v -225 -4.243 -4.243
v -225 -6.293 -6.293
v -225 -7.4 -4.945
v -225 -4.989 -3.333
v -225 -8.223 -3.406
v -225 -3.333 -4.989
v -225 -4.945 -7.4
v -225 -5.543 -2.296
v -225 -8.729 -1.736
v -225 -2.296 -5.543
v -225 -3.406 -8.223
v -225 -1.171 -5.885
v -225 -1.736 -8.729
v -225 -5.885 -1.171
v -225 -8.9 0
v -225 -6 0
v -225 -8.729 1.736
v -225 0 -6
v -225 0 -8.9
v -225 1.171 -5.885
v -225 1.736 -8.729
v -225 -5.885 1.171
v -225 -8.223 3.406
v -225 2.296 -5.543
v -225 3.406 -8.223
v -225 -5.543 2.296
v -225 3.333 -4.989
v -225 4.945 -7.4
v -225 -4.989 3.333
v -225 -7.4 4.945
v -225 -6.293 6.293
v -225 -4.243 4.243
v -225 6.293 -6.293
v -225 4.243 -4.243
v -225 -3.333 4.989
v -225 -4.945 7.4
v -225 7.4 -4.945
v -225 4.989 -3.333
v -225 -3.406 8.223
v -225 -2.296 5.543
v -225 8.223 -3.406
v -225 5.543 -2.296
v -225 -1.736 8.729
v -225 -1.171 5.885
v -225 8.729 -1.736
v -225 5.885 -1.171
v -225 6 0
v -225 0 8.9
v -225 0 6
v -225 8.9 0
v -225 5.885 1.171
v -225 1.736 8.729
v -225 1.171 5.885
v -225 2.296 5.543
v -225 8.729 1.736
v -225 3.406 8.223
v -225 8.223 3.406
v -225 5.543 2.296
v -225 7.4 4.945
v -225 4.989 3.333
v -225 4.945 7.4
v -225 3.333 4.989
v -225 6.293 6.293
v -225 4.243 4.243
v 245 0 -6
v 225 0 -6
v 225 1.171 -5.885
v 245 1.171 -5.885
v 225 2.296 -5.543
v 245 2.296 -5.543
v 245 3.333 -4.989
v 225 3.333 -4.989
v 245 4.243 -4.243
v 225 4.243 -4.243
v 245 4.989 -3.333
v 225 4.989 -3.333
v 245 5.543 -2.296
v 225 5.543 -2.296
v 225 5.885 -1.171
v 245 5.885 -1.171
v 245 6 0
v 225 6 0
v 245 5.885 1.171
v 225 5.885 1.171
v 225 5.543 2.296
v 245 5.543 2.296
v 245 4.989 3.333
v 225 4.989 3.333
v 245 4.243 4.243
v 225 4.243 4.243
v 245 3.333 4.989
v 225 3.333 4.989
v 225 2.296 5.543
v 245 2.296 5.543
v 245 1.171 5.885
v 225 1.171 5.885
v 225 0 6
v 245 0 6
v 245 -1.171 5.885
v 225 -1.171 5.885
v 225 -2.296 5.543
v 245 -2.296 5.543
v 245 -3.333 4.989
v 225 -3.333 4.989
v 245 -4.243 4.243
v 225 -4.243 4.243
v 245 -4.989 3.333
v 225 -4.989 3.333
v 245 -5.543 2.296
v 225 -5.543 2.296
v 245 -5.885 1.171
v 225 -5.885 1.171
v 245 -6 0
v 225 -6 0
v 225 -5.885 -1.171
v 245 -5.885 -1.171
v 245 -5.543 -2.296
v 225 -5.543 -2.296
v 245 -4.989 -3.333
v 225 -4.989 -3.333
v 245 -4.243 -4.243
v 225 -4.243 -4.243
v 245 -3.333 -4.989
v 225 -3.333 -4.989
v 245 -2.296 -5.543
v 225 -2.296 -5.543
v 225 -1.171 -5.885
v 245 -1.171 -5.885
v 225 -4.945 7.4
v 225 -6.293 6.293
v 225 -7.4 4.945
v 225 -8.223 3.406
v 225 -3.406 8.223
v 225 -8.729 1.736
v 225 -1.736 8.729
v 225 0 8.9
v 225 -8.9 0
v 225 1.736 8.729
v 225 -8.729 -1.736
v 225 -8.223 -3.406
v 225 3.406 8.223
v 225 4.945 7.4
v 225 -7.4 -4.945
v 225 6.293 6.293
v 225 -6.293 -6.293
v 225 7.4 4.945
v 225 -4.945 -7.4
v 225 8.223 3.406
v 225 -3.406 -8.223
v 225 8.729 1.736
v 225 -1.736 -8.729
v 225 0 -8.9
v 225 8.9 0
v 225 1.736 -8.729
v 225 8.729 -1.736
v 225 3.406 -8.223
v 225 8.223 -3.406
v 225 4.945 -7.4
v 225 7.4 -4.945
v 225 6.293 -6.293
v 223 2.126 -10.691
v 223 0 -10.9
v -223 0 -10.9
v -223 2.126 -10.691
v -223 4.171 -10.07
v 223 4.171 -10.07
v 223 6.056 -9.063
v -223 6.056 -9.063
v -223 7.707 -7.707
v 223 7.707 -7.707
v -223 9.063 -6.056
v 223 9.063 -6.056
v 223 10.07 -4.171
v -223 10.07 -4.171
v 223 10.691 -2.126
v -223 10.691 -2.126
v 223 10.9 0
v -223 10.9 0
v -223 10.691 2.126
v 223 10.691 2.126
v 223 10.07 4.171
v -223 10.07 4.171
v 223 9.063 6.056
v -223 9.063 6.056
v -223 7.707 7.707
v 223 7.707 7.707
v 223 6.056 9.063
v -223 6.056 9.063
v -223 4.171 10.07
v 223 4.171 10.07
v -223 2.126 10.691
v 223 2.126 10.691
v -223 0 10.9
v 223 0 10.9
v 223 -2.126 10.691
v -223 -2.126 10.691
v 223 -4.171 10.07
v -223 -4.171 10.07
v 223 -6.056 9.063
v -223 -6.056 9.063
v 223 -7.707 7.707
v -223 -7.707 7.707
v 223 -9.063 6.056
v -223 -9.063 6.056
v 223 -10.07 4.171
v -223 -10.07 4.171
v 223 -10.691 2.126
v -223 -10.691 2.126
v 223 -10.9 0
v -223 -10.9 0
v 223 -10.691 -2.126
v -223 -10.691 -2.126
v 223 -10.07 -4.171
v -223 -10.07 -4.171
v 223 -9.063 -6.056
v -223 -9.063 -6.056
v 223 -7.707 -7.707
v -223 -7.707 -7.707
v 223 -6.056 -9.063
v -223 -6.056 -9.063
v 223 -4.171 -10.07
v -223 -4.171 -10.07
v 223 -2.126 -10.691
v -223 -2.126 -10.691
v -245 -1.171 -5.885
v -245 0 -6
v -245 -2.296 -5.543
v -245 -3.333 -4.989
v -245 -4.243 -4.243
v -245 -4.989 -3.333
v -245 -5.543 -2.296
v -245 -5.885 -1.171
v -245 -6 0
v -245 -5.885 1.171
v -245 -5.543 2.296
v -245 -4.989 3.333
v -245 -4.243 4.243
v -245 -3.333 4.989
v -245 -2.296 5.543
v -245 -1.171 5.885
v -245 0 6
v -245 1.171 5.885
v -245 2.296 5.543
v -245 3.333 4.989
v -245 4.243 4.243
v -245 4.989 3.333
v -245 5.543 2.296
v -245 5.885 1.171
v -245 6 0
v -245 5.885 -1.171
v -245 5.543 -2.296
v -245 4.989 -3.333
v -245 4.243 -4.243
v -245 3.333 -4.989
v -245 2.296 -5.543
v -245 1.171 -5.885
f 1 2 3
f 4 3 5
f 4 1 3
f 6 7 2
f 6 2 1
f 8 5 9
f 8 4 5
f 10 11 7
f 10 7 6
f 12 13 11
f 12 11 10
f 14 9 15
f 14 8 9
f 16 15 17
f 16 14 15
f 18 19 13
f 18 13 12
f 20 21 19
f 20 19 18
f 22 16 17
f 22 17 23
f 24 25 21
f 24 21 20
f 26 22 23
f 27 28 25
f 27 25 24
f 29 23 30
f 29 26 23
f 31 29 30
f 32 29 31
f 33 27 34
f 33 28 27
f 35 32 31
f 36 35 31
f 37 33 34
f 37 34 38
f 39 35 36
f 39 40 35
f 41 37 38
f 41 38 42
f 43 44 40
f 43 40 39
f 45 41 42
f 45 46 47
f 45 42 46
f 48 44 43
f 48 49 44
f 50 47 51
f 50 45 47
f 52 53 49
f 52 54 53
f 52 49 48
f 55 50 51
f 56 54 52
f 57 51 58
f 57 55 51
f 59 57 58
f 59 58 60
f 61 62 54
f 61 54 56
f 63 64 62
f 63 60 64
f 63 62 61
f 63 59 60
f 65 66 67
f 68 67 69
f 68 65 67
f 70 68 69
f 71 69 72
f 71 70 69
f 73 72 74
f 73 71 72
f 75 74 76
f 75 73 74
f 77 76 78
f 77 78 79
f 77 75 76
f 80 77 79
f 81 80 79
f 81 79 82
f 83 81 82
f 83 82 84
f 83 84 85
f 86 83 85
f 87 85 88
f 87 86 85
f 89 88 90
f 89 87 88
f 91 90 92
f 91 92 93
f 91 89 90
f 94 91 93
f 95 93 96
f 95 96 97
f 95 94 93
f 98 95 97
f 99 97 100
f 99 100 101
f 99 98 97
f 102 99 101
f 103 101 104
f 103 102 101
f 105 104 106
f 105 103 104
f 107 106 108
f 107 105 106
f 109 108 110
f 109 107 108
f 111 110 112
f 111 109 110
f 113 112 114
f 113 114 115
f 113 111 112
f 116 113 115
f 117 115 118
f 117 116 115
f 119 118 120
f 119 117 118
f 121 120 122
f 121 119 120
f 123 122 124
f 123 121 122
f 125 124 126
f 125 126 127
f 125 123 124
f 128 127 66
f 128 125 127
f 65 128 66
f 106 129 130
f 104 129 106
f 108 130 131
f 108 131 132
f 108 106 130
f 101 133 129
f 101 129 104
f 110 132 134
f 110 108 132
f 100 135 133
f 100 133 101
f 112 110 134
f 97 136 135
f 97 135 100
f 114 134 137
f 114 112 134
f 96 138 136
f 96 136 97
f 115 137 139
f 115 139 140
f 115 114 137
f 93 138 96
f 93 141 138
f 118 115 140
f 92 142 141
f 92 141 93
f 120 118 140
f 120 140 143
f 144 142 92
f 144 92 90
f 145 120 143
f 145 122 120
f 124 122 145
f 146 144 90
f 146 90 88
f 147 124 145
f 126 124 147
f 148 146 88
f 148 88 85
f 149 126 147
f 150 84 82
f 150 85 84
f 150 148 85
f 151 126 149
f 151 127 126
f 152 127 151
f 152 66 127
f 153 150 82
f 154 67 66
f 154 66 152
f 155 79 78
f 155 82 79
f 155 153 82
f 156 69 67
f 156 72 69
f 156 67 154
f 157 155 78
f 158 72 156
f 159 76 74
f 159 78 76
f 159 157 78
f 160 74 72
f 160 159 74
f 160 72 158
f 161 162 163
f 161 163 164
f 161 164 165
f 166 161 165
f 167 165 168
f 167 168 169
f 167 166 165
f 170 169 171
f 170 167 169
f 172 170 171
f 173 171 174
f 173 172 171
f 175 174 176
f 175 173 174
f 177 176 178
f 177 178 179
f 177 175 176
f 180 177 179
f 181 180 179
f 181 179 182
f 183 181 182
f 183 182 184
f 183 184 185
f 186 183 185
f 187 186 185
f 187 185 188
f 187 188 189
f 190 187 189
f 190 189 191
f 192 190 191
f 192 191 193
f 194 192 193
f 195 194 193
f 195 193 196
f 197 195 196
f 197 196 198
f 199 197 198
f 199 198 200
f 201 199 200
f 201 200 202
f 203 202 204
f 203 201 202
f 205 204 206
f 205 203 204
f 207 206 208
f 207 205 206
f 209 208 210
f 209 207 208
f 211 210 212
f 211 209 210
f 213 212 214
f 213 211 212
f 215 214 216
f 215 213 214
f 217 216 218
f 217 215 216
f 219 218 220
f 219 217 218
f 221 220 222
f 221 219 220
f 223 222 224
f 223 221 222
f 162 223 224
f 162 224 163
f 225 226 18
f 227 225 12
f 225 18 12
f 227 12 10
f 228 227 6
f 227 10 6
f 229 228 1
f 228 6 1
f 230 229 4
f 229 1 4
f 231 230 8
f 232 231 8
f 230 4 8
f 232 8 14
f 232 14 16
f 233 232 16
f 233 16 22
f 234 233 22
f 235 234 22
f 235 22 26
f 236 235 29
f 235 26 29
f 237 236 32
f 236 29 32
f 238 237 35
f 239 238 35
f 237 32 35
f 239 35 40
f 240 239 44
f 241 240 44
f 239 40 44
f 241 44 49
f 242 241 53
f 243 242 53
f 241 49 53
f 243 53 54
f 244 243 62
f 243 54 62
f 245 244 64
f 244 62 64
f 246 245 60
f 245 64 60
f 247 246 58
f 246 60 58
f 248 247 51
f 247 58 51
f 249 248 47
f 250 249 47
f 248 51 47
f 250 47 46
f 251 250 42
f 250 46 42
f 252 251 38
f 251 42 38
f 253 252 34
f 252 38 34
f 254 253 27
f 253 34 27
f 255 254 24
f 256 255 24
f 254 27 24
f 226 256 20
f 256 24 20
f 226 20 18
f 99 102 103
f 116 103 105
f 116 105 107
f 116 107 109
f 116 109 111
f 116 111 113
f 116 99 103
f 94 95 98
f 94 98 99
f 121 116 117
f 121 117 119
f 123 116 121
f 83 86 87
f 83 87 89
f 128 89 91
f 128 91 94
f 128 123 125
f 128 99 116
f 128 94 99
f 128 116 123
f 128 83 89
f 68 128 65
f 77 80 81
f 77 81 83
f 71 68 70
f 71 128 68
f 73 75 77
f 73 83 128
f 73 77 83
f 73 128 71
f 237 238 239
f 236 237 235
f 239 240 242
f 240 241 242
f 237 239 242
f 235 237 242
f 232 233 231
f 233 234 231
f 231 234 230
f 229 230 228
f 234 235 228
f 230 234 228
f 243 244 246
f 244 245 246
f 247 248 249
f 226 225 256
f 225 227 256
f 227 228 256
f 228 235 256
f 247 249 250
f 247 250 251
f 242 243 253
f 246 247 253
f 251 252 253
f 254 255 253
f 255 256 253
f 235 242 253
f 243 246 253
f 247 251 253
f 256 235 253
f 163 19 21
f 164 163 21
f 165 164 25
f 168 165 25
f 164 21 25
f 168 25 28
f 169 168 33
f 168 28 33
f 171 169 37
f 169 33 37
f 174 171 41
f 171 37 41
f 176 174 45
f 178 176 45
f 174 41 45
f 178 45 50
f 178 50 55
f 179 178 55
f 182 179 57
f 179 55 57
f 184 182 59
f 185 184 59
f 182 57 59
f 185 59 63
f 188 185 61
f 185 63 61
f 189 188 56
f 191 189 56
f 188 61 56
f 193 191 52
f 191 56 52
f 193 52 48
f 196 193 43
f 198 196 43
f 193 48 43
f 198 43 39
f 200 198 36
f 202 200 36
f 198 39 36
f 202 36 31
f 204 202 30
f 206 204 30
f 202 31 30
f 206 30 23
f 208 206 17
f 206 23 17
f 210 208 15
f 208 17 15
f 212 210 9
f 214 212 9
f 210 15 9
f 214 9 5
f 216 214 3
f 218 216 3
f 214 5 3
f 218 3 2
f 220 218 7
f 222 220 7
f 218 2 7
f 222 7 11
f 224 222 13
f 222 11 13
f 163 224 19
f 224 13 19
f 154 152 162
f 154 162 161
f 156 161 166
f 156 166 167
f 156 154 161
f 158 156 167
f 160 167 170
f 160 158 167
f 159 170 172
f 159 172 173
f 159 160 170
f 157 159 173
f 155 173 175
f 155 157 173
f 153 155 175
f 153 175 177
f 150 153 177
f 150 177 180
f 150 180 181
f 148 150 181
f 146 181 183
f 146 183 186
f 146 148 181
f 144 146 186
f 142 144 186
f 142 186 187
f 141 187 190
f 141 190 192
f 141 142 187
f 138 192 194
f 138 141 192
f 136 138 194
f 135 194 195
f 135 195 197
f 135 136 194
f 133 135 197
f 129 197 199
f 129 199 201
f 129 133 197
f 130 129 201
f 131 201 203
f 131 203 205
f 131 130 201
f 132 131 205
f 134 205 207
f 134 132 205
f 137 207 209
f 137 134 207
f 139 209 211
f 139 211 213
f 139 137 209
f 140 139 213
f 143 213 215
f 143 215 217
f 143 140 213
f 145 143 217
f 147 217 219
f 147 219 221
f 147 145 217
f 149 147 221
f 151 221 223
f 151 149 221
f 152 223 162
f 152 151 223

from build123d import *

# Parameters (mm, degrees)
SKETCH1_R           = 10.9
BOSS_EXTRUDE1_DEPTH = 245
SKETCH2_R           = 10.9
SKETCH2_R_2         = 6
CUT_EXTRUDE1_DEPTH  = 20
CUT_EXTRUDE2_START  = -20
SKETCH4_R           = 10.9
SKETCH4_R_2         = 6
CUT_EXTRUDE2_DEPTH  = 20
CHAMFER1_SIZE       = 2


with BuildPart() as part:
    # Sketch1 → Boss-Extrude1 (new, symmetric)
    with BuildSketch(Plane(origin=(0, 0, 0), x_dir=(0, 0, -1), z_dir=(1, 0, 0))):
        Circle(SKETCH1_R)
    extrude(amount=BOSS_EXTRUDE1_DEPTH, both=True)

    # Sketch2 → Cut-Extrude1 (cut)
    with BuildSketch(Plane(origin=(245, 0, 0), x_dir=(0, 0, -1), z_dir=(1, 0, 0))):
        Circle(SKETCH2_R)
        Circle(SKETCH2_R_2, mode=Mode.SUBTRACT)
    extrude(amount=-CUT_EXTRUDE1_DEPTH, mode=Mode.SUBTRACT)

    # Sketch4 → Cut-Extrude2 (cut)
    with BuildSketch(Plane.ZY.offset(245).offset(CUT_EXTRUDE2_START)):
        Circle(SKETCH4_R)
        with Locations(Location((0, 0, 0), (0, 0, 180))):
            Circle(SKETCH4_R_2, mode=Mode.SUBTRACT)
    extrude(amount=CUT_EXTRUDE2_DEPTH, mode=Mode.SUBTRACT)

    # Chamfer1
    chamfer1_edges = [part.edges().sort_by_distance(p)[0] for p in [
        (-225, 0, 10.9),
        (225, 0, 10.9),
    ]]
    chamfer(chamfer1_edges, length=CHAMFER1_SIZE)


solid = part.part
